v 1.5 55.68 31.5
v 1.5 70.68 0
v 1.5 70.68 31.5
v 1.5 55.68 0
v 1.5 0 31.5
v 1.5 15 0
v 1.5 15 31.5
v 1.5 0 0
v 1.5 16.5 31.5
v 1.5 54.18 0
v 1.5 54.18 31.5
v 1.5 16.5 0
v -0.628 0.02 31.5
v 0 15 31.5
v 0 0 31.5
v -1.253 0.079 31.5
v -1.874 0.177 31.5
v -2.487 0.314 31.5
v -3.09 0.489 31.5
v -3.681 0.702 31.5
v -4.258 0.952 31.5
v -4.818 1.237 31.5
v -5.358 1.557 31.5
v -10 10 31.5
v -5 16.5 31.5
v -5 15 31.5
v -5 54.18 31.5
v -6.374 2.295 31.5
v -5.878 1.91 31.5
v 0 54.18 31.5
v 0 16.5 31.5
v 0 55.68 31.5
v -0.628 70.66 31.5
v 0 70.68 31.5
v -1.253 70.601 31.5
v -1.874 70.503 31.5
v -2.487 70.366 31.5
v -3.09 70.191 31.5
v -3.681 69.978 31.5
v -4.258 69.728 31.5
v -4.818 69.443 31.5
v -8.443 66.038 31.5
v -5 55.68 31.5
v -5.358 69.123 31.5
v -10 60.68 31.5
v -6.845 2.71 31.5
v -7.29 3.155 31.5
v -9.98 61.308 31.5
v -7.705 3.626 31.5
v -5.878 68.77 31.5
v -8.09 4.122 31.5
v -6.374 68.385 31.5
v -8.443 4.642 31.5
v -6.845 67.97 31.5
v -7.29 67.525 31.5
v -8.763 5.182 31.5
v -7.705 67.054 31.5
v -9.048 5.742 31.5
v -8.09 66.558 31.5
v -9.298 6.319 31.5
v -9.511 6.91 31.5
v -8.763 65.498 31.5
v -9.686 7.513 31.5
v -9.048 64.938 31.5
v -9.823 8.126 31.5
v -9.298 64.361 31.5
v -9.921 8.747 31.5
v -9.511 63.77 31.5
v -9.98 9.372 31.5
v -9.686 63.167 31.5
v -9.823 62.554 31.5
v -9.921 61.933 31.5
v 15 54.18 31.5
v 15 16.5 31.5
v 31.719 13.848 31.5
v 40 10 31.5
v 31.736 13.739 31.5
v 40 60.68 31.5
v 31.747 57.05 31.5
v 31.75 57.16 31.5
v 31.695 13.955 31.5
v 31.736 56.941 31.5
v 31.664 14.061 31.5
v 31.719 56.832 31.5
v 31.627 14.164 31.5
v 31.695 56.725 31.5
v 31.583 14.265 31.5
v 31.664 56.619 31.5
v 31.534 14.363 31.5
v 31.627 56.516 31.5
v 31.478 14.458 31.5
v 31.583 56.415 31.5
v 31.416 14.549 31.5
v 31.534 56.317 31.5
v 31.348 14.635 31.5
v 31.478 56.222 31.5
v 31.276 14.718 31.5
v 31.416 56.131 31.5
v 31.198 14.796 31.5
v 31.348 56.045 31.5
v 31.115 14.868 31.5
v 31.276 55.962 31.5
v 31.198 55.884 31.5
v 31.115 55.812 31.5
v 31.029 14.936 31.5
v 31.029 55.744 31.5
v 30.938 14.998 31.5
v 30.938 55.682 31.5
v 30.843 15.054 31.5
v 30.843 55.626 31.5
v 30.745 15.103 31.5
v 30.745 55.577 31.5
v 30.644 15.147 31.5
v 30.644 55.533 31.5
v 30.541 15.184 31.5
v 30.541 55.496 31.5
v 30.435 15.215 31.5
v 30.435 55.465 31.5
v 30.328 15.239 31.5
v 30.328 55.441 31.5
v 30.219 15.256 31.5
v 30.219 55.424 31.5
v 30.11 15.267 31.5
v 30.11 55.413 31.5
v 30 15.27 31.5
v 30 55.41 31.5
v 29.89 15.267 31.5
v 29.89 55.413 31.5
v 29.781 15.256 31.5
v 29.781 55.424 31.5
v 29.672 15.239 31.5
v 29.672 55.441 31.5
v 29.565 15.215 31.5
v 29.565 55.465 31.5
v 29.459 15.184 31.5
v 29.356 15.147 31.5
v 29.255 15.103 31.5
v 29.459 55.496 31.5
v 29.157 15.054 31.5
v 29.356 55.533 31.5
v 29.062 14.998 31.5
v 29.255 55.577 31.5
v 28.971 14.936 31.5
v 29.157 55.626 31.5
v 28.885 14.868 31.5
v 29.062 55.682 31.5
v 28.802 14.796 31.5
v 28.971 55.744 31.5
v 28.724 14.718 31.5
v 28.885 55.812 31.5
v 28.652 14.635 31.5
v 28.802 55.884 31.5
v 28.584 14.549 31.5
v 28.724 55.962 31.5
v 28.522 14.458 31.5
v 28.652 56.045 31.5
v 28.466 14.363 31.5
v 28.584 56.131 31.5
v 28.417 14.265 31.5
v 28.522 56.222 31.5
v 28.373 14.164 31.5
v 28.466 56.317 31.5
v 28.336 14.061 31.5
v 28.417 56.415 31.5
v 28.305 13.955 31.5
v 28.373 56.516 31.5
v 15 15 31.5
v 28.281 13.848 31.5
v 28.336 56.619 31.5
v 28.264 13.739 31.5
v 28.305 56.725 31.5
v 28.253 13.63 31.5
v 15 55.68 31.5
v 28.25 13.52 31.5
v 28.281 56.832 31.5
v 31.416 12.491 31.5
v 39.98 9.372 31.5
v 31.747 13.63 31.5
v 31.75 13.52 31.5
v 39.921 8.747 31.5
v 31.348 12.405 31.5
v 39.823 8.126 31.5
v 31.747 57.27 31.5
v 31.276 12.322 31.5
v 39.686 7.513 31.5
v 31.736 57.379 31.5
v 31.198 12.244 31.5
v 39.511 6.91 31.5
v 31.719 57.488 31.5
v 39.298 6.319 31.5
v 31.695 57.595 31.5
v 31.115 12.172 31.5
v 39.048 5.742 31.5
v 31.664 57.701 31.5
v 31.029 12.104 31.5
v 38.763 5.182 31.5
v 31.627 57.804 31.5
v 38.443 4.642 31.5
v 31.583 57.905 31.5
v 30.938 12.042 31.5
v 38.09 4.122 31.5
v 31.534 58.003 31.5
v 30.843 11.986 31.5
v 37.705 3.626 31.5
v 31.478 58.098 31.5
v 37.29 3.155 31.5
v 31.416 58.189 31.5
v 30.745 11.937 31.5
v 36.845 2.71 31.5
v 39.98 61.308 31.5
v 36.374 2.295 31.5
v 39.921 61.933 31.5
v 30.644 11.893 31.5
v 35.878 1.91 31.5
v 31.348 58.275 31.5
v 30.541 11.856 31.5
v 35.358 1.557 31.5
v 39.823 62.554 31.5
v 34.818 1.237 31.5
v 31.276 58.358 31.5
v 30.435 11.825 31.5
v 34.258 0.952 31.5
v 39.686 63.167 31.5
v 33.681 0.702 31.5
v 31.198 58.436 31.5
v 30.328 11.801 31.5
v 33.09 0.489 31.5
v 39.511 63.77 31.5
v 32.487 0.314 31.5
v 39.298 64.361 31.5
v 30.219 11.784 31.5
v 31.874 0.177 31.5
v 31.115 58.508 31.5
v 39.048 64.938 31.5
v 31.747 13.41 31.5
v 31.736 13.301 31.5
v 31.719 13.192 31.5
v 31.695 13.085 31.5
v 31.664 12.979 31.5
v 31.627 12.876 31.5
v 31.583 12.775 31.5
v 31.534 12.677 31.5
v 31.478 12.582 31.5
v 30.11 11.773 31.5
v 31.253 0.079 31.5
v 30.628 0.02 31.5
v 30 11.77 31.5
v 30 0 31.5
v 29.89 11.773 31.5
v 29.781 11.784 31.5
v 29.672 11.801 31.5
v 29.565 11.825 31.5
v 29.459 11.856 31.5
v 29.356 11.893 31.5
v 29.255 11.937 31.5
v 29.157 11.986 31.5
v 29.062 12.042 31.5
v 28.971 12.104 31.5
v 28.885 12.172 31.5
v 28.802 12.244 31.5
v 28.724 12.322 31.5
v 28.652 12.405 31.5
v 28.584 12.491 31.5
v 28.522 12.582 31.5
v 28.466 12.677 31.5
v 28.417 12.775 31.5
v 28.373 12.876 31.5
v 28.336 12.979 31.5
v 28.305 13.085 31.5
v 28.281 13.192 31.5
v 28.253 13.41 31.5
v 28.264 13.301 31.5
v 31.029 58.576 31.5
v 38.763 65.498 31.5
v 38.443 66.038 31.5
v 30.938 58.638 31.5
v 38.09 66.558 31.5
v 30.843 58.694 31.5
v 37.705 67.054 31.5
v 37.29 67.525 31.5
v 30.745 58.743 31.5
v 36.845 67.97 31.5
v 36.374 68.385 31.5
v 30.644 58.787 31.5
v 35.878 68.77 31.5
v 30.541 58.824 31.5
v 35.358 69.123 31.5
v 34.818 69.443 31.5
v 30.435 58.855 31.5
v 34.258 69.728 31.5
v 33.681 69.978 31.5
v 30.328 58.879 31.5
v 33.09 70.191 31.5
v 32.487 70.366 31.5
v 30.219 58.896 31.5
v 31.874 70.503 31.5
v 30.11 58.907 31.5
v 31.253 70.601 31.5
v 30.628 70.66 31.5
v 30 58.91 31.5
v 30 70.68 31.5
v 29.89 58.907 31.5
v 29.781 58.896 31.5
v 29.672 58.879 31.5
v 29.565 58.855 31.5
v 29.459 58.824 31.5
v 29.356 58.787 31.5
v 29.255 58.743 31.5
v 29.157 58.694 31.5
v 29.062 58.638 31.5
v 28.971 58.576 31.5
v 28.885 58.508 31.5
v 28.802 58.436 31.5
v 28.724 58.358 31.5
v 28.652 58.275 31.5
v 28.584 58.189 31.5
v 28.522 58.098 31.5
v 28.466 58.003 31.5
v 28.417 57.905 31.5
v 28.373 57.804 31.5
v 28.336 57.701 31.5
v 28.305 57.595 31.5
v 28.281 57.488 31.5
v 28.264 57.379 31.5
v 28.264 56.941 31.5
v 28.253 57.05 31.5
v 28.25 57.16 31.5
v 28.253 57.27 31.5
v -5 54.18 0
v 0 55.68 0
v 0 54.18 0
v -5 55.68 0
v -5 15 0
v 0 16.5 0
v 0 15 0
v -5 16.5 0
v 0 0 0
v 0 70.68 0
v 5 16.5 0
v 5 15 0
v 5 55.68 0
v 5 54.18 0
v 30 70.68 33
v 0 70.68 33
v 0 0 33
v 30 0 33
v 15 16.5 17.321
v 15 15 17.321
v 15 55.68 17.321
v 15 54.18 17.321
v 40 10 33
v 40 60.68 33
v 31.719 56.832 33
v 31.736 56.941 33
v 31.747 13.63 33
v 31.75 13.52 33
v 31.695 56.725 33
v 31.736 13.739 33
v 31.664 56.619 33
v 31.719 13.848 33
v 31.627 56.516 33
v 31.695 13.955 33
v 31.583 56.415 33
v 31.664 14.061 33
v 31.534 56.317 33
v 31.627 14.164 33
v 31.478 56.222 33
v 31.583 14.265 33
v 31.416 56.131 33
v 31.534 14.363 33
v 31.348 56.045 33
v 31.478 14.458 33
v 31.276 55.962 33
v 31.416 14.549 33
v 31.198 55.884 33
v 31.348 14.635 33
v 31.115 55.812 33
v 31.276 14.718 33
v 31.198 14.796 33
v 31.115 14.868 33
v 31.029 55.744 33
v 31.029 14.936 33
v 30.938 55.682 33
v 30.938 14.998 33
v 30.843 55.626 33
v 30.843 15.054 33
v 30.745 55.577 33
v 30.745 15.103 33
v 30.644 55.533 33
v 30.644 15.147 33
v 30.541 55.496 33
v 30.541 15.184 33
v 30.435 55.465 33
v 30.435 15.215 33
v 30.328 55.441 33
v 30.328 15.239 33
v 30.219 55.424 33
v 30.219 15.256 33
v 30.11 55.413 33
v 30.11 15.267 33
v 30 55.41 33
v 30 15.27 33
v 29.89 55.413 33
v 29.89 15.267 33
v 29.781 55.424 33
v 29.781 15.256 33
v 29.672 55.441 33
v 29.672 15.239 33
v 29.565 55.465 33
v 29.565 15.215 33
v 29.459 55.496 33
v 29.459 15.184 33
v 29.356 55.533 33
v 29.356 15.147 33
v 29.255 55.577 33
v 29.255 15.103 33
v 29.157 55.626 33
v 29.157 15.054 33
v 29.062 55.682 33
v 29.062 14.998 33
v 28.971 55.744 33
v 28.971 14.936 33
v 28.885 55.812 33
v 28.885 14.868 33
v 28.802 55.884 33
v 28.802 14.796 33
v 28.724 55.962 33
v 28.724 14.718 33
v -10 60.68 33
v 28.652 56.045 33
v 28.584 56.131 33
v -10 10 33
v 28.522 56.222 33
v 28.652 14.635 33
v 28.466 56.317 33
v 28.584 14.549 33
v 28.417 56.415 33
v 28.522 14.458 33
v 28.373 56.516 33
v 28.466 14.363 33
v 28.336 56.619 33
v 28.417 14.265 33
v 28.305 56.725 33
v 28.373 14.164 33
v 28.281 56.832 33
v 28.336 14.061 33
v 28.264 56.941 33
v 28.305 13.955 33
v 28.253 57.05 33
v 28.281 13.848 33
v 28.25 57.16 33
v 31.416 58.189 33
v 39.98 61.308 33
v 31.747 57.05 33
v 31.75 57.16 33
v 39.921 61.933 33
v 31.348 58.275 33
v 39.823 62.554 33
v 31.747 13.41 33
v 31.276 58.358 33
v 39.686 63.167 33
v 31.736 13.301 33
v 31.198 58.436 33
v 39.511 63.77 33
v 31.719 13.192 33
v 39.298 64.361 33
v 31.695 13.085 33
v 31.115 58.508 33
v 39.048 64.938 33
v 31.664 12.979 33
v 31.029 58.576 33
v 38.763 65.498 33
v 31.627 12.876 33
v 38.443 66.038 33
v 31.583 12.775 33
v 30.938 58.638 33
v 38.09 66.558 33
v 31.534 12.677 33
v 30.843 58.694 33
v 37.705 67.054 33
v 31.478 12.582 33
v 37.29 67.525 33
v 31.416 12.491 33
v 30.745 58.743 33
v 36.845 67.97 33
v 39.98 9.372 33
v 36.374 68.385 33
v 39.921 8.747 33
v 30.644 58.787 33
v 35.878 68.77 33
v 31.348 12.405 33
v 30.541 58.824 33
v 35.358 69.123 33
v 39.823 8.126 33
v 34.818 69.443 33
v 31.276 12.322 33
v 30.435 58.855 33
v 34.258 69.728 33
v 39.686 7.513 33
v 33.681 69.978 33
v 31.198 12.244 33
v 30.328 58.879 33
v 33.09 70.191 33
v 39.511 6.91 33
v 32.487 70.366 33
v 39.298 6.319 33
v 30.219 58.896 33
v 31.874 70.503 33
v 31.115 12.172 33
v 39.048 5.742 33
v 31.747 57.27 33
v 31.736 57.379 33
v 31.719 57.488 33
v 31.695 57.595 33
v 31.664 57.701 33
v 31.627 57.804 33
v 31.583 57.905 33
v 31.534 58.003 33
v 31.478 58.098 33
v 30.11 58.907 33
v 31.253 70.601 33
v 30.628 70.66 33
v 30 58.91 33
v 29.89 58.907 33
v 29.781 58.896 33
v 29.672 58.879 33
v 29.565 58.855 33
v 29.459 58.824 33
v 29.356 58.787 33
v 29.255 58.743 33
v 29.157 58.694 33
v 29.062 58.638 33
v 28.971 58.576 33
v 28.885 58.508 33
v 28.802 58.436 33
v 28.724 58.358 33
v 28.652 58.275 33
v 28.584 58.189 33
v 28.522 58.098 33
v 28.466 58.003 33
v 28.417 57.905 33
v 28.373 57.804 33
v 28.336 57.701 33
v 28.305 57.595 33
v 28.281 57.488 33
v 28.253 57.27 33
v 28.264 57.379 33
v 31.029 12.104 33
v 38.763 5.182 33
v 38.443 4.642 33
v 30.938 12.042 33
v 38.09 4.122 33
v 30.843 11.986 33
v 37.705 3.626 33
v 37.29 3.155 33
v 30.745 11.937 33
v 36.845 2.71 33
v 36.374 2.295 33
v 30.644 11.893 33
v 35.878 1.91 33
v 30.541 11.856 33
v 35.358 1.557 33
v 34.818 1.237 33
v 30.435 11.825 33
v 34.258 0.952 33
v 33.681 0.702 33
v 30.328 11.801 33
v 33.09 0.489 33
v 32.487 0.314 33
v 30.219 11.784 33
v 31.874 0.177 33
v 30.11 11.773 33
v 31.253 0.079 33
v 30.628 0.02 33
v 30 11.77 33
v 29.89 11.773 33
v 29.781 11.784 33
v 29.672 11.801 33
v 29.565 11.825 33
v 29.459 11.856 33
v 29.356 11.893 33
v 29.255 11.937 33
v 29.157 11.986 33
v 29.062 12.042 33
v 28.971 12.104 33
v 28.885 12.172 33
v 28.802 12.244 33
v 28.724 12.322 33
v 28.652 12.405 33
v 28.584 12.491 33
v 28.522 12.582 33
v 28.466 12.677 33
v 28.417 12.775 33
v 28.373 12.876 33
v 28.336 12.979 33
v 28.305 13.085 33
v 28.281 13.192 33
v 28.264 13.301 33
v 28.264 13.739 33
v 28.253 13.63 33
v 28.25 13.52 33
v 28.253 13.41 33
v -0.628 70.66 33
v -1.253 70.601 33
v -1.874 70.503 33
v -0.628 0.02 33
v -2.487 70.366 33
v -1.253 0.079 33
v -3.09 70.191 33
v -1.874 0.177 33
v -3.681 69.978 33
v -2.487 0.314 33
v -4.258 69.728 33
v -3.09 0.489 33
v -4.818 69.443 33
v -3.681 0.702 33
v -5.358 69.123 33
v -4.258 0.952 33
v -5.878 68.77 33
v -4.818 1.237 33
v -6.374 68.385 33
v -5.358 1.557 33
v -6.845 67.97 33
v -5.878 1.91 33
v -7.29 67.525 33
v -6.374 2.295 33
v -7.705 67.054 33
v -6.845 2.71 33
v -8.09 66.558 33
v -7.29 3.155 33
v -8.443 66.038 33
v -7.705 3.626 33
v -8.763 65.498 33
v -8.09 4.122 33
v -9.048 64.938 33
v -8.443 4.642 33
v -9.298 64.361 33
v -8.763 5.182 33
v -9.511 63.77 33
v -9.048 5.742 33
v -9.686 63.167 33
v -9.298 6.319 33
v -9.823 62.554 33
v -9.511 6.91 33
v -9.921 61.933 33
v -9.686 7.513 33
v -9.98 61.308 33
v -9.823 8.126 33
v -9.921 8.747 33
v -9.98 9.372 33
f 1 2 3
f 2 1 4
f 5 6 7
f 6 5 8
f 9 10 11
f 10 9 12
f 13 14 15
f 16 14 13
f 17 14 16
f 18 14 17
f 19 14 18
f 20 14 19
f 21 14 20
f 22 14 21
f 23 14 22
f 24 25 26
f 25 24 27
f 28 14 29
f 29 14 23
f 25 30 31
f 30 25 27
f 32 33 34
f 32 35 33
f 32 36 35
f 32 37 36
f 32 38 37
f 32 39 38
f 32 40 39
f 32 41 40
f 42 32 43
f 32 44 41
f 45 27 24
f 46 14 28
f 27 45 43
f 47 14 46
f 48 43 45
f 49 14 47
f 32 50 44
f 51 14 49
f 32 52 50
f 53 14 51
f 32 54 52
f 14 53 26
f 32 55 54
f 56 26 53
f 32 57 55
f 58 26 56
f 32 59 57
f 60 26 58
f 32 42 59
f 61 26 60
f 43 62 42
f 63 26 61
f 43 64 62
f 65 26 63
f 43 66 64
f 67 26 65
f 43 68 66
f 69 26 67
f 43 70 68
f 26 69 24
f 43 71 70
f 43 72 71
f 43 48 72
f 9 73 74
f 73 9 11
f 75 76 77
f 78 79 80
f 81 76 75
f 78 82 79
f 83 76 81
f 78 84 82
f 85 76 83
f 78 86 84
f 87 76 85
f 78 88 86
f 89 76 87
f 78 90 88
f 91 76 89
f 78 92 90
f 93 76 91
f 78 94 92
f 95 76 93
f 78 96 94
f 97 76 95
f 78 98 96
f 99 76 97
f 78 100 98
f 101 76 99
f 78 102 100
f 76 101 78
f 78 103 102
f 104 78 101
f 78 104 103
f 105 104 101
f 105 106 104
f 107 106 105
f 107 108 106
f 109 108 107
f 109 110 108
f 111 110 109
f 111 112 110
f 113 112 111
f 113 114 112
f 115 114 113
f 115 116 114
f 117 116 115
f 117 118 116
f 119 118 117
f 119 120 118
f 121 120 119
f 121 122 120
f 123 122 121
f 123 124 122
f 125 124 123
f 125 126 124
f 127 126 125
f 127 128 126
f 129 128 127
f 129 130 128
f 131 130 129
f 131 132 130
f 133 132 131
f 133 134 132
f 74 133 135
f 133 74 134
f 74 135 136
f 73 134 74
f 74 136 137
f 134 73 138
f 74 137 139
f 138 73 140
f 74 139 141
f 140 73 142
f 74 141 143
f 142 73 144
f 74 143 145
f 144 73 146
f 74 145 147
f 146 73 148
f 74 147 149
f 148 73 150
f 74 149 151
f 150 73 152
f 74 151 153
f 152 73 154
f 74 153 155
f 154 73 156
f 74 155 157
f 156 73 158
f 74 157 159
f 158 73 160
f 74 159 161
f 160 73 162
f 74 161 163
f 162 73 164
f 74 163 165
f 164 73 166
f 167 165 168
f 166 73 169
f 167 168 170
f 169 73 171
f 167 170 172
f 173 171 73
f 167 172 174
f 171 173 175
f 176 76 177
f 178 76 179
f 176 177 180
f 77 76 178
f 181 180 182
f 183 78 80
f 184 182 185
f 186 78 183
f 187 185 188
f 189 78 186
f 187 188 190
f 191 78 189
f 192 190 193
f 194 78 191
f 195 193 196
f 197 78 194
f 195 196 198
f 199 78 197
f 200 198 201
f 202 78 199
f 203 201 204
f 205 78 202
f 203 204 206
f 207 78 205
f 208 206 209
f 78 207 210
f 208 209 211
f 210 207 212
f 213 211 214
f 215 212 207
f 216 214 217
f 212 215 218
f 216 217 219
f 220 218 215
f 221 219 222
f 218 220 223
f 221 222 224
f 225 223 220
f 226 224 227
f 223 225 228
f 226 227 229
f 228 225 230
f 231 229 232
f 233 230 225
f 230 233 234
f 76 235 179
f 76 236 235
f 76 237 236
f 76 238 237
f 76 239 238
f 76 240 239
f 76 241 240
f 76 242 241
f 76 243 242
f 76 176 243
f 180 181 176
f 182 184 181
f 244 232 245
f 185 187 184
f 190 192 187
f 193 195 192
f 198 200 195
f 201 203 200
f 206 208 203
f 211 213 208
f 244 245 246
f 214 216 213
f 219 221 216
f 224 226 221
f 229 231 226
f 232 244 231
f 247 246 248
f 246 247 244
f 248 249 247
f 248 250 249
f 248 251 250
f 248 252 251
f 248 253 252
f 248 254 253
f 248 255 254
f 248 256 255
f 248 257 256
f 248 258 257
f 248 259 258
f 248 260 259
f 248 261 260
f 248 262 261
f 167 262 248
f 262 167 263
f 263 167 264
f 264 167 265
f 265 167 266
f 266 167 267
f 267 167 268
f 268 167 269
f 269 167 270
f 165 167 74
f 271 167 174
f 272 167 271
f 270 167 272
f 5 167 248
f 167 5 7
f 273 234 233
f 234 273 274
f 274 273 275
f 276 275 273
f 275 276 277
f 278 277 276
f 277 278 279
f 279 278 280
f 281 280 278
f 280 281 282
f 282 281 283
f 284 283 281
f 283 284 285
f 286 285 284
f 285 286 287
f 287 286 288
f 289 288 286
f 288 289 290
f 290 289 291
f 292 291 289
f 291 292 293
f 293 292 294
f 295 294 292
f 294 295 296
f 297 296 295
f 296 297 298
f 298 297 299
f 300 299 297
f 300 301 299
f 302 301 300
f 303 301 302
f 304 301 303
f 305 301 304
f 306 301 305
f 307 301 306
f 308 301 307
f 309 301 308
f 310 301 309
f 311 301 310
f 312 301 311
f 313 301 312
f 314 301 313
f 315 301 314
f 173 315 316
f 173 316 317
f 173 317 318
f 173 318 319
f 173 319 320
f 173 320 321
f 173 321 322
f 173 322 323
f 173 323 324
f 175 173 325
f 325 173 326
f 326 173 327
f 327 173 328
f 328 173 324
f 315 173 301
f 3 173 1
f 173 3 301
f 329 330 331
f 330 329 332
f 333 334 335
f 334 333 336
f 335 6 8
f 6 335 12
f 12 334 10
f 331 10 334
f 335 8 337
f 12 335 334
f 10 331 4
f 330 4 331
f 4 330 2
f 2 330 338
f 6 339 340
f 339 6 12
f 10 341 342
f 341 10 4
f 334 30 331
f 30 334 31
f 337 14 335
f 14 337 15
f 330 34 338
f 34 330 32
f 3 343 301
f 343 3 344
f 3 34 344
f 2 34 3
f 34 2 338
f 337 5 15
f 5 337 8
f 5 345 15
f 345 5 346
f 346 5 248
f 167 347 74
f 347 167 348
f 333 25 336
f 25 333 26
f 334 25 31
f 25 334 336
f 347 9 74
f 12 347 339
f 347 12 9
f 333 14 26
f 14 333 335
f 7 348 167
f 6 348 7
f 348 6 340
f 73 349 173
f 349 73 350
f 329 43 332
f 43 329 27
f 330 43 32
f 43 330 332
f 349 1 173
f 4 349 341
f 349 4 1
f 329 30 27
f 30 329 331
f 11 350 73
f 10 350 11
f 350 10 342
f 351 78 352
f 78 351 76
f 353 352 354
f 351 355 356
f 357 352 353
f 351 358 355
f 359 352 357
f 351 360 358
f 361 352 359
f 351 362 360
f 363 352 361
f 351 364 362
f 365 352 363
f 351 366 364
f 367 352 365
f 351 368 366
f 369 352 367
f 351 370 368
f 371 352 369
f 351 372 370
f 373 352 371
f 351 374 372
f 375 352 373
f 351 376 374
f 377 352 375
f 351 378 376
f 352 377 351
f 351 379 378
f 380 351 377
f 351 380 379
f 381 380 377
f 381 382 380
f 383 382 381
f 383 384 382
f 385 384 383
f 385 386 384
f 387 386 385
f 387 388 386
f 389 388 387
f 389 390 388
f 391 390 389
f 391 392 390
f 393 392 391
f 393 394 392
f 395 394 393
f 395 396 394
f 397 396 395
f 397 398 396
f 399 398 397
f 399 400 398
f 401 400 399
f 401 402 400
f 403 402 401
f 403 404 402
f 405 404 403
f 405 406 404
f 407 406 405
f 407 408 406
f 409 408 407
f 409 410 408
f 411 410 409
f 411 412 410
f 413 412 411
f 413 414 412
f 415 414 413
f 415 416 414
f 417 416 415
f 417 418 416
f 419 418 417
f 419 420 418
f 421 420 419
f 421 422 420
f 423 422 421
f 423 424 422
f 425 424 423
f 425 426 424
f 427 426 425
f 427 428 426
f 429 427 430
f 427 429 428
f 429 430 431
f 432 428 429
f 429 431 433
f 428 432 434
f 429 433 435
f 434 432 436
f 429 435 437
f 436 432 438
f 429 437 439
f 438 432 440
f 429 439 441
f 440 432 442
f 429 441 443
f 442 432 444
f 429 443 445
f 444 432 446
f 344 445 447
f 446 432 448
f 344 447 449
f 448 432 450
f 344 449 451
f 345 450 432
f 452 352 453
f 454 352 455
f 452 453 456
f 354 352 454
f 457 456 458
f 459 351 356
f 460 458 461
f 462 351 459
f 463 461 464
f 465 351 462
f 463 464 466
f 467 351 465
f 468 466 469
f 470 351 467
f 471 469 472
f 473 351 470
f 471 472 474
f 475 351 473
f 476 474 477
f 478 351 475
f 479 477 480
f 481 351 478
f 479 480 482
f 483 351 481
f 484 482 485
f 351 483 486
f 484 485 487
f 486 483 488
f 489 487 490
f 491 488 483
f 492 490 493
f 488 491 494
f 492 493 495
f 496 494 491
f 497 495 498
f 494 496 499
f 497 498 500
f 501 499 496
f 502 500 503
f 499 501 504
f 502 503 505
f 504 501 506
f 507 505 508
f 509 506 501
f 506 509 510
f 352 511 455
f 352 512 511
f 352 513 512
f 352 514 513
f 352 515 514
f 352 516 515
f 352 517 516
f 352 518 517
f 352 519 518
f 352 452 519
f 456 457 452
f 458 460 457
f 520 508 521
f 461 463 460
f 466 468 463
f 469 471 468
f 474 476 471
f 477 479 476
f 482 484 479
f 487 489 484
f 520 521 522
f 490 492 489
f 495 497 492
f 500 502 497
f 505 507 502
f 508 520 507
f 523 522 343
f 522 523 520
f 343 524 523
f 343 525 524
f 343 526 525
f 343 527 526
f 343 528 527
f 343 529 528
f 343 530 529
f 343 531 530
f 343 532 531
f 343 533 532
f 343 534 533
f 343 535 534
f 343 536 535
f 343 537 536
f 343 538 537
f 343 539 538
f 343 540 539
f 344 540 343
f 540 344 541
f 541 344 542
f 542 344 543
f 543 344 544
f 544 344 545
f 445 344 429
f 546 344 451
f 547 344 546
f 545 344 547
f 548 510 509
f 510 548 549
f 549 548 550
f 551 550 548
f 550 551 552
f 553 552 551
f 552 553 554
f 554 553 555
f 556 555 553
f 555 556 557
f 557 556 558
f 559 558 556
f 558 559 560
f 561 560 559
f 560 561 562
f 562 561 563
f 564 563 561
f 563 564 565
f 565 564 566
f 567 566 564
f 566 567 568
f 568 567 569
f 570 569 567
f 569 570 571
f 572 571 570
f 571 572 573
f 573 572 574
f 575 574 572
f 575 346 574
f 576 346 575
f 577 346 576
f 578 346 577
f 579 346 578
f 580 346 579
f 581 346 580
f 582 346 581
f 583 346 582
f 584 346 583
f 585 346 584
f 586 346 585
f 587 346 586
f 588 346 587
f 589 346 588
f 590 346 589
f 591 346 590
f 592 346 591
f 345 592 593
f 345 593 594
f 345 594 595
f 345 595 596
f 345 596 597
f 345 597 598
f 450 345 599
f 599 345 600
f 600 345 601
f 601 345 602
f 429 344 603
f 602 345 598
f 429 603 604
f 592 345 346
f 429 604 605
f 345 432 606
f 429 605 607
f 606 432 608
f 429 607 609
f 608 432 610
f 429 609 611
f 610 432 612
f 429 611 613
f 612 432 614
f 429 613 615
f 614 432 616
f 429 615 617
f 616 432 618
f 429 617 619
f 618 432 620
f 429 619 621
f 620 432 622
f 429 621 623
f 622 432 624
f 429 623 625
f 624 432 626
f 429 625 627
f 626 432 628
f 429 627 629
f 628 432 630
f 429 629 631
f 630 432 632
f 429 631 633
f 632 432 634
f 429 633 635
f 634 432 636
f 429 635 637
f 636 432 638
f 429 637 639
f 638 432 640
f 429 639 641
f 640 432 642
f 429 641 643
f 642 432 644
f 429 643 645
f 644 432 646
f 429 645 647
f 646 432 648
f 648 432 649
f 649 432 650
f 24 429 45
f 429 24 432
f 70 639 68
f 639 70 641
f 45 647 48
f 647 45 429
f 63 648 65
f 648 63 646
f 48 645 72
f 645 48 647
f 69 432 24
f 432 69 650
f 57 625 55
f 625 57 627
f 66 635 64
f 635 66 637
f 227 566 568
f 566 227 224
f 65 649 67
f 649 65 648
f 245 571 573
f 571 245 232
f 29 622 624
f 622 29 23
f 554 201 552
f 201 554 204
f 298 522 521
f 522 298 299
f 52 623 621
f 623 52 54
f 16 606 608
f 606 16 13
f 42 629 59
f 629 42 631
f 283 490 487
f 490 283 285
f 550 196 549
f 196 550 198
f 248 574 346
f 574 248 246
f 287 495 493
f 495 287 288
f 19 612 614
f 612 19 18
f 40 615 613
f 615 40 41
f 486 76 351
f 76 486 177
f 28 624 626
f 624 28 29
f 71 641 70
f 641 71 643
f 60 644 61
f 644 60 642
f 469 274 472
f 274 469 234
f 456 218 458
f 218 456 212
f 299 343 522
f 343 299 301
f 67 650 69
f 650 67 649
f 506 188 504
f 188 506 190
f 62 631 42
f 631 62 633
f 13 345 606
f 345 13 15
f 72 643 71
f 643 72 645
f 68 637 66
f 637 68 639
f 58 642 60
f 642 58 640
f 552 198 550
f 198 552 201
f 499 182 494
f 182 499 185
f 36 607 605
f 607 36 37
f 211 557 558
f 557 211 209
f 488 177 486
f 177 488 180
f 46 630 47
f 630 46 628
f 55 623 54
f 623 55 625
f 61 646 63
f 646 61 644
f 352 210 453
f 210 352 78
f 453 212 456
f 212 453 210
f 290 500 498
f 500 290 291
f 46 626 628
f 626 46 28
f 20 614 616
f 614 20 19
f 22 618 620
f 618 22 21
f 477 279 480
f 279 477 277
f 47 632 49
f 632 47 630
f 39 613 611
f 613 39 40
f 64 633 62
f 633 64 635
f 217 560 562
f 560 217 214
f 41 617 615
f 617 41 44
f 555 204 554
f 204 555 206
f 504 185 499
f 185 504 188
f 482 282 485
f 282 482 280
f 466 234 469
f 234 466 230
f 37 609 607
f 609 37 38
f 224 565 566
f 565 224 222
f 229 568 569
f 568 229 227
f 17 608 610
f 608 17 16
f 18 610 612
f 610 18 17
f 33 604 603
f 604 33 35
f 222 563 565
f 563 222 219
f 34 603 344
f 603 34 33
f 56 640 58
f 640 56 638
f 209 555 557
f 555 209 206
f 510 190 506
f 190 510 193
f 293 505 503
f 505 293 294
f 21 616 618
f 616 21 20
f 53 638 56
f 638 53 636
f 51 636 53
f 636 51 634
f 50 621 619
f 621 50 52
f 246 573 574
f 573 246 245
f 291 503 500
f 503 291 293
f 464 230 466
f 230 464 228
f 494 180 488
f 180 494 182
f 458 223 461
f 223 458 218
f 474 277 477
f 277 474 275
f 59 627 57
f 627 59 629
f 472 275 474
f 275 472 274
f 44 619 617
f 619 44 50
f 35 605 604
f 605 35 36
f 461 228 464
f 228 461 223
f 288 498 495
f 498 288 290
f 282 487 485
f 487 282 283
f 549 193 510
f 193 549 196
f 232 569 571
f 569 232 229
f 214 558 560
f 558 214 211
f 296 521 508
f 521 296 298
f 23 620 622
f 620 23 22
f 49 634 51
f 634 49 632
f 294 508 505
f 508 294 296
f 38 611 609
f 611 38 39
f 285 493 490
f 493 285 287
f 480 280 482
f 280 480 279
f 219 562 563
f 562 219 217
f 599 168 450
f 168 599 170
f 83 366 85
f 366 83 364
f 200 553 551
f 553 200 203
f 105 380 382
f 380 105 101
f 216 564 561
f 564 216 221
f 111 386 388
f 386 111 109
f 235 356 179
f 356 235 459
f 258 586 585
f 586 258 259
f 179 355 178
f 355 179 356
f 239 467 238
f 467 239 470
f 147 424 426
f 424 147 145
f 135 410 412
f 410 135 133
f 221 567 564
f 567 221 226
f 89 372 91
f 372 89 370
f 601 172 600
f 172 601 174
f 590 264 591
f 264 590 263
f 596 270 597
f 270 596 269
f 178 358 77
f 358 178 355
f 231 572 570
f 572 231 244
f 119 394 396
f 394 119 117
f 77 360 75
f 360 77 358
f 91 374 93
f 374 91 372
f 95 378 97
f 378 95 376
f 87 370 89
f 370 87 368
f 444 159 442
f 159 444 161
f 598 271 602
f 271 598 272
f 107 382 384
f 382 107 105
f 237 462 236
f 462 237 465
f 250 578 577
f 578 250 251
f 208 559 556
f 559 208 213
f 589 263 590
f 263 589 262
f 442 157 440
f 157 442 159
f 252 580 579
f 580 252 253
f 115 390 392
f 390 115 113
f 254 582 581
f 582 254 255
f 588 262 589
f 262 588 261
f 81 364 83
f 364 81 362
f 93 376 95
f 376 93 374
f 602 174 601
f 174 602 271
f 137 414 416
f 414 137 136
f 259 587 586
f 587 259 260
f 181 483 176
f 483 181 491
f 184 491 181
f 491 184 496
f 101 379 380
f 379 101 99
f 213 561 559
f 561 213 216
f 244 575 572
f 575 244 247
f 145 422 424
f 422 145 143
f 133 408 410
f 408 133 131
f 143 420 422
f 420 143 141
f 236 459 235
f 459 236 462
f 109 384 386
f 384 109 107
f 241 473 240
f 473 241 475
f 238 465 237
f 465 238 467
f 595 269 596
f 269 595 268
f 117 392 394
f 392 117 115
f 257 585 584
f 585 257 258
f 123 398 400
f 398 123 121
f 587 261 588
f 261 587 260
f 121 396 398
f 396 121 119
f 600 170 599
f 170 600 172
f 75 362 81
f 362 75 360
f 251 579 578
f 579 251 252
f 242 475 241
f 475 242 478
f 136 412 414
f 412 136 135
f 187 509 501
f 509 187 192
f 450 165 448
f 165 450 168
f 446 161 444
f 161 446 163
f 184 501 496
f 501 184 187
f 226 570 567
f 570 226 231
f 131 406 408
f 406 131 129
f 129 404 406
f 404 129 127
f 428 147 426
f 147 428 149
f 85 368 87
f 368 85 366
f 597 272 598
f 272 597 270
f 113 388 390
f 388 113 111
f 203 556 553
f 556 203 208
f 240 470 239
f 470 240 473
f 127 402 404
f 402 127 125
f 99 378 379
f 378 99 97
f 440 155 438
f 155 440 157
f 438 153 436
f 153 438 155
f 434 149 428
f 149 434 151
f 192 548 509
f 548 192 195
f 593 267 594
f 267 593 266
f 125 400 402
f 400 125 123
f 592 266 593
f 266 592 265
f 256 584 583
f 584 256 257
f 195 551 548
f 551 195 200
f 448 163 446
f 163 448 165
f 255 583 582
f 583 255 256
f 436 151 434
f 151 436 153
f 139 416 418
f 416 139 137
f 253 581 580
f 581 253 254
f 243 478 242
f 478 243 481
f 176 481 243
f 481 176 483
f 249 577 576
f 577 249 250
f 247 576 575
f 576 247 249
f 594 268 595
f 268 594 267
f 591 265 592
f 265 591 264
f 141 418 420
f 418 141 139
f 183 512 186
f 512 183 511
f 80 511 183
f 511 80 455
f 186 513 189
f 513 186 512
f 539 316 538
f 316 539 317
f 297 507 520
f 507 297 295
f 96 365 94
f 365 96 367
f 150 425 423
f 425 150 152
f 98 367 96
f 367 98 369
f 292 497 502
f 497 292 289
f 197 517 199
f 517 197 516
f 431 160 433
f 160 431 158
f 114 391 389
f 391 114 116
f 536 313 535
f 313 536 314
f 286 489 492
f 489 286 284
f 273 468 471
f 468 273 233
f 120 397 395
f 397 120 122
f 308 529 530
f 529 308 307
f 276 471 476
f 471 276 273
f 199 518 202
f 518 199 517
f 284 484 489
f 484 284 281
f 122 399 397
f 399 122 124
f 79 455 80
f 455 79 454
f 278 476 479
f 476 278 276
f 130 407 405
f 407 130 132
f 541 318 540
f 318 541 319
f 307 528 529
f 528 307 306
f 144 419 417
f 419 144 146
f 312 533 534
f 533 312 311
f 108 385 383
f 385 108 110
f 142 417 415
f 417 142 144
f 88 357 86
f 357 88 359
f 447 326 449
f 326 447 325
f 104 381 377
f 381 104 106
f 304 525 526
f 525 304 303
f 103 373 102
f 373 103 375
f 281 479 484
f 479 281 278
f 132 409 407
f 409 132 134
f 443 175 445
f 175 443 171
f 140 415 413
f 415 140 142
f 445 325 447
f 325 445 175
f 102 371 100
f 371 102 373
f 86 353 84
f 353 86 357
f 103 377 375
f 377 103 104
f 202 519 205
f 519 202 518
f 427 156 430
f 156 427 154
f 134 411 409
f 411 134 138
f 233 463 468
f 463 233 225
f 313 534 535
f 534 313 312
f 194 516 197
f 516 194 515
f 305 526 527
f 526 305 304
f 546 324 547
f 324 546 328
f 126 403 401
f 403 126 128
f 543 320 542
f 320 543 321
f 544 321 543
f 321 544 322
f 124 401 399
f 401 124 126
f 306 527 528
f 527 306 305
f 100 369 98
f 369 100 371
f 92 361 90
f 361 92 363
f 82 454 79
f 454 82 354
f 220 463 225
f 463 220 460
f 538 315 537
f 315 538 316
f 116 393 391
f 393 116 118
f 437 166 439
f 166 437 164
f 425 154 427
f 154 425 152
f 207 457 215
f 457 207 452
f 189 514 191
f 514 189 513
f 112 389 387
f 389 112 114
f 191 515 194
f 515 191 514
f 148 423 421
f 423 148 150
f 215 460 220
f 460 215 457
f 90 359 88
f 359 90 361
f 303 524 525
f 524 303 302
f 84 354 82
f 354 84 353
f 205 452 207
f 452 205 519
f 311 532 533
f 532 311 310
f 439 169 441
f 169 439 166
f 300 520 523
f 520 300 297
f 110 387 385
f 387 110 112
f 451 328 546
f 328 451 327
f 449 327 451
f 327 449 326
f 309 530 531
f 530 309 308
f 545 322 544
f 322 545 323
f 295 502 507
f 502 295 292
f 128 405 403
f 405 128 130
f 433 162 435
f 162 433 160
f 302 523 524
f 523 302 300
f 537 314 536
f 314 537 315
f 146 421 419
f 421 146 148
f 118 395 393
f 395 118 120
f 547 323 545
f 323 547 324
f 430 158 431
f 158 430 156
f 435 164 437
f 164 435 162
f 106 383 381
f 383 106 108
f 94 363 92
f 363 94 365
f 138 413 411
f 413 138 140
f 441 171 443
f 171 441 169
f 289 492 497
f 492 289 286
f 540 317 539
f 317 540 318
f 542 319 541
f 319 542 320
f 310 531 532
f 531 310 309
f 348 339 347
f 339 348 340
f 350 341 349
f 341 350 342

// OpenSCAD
$fn=100;

difference() {
  union() {
    cube(size=[1.5, 70.68, 31.50]);
    translate([-5,15,0]) cube(size=[20, 1.5, 31.50]);
    translate([-5,70.68 - 15 - 1.5,0]) cube(size=[20, 1.5, 31.50]);
    translate([0,10,31.5]) cube(size=[40, 50.68, 1.5]);

    hull() {
      translate([0,10,31.5]) cylinder(r=10, h=1.5);
      translate([30,10,31.5]) cylinder(r=10, h=1.5);
      translate([0,60.68,31.5]) cylinder(r=10, h=1.5);
      translate([30,60.68,31.5]) cylinder(r=10, h=1.5);
    }
  }
  translate([30,13.52,0]) cylinder(r=1.75, h=50);
  translate([30,70.68 - 13.52, 0]) cylinder(r=1.75, h=50);

  translate([5,0,0]) rotate([0,30,0]) cube(size=[31.50, 70.68, 36]);

  // translate([-11,-40,0]) cube(size=[50, 40, 40]);
  // translate([-11,70.68,0]) cube(size=[50, 40, 40]);
}
